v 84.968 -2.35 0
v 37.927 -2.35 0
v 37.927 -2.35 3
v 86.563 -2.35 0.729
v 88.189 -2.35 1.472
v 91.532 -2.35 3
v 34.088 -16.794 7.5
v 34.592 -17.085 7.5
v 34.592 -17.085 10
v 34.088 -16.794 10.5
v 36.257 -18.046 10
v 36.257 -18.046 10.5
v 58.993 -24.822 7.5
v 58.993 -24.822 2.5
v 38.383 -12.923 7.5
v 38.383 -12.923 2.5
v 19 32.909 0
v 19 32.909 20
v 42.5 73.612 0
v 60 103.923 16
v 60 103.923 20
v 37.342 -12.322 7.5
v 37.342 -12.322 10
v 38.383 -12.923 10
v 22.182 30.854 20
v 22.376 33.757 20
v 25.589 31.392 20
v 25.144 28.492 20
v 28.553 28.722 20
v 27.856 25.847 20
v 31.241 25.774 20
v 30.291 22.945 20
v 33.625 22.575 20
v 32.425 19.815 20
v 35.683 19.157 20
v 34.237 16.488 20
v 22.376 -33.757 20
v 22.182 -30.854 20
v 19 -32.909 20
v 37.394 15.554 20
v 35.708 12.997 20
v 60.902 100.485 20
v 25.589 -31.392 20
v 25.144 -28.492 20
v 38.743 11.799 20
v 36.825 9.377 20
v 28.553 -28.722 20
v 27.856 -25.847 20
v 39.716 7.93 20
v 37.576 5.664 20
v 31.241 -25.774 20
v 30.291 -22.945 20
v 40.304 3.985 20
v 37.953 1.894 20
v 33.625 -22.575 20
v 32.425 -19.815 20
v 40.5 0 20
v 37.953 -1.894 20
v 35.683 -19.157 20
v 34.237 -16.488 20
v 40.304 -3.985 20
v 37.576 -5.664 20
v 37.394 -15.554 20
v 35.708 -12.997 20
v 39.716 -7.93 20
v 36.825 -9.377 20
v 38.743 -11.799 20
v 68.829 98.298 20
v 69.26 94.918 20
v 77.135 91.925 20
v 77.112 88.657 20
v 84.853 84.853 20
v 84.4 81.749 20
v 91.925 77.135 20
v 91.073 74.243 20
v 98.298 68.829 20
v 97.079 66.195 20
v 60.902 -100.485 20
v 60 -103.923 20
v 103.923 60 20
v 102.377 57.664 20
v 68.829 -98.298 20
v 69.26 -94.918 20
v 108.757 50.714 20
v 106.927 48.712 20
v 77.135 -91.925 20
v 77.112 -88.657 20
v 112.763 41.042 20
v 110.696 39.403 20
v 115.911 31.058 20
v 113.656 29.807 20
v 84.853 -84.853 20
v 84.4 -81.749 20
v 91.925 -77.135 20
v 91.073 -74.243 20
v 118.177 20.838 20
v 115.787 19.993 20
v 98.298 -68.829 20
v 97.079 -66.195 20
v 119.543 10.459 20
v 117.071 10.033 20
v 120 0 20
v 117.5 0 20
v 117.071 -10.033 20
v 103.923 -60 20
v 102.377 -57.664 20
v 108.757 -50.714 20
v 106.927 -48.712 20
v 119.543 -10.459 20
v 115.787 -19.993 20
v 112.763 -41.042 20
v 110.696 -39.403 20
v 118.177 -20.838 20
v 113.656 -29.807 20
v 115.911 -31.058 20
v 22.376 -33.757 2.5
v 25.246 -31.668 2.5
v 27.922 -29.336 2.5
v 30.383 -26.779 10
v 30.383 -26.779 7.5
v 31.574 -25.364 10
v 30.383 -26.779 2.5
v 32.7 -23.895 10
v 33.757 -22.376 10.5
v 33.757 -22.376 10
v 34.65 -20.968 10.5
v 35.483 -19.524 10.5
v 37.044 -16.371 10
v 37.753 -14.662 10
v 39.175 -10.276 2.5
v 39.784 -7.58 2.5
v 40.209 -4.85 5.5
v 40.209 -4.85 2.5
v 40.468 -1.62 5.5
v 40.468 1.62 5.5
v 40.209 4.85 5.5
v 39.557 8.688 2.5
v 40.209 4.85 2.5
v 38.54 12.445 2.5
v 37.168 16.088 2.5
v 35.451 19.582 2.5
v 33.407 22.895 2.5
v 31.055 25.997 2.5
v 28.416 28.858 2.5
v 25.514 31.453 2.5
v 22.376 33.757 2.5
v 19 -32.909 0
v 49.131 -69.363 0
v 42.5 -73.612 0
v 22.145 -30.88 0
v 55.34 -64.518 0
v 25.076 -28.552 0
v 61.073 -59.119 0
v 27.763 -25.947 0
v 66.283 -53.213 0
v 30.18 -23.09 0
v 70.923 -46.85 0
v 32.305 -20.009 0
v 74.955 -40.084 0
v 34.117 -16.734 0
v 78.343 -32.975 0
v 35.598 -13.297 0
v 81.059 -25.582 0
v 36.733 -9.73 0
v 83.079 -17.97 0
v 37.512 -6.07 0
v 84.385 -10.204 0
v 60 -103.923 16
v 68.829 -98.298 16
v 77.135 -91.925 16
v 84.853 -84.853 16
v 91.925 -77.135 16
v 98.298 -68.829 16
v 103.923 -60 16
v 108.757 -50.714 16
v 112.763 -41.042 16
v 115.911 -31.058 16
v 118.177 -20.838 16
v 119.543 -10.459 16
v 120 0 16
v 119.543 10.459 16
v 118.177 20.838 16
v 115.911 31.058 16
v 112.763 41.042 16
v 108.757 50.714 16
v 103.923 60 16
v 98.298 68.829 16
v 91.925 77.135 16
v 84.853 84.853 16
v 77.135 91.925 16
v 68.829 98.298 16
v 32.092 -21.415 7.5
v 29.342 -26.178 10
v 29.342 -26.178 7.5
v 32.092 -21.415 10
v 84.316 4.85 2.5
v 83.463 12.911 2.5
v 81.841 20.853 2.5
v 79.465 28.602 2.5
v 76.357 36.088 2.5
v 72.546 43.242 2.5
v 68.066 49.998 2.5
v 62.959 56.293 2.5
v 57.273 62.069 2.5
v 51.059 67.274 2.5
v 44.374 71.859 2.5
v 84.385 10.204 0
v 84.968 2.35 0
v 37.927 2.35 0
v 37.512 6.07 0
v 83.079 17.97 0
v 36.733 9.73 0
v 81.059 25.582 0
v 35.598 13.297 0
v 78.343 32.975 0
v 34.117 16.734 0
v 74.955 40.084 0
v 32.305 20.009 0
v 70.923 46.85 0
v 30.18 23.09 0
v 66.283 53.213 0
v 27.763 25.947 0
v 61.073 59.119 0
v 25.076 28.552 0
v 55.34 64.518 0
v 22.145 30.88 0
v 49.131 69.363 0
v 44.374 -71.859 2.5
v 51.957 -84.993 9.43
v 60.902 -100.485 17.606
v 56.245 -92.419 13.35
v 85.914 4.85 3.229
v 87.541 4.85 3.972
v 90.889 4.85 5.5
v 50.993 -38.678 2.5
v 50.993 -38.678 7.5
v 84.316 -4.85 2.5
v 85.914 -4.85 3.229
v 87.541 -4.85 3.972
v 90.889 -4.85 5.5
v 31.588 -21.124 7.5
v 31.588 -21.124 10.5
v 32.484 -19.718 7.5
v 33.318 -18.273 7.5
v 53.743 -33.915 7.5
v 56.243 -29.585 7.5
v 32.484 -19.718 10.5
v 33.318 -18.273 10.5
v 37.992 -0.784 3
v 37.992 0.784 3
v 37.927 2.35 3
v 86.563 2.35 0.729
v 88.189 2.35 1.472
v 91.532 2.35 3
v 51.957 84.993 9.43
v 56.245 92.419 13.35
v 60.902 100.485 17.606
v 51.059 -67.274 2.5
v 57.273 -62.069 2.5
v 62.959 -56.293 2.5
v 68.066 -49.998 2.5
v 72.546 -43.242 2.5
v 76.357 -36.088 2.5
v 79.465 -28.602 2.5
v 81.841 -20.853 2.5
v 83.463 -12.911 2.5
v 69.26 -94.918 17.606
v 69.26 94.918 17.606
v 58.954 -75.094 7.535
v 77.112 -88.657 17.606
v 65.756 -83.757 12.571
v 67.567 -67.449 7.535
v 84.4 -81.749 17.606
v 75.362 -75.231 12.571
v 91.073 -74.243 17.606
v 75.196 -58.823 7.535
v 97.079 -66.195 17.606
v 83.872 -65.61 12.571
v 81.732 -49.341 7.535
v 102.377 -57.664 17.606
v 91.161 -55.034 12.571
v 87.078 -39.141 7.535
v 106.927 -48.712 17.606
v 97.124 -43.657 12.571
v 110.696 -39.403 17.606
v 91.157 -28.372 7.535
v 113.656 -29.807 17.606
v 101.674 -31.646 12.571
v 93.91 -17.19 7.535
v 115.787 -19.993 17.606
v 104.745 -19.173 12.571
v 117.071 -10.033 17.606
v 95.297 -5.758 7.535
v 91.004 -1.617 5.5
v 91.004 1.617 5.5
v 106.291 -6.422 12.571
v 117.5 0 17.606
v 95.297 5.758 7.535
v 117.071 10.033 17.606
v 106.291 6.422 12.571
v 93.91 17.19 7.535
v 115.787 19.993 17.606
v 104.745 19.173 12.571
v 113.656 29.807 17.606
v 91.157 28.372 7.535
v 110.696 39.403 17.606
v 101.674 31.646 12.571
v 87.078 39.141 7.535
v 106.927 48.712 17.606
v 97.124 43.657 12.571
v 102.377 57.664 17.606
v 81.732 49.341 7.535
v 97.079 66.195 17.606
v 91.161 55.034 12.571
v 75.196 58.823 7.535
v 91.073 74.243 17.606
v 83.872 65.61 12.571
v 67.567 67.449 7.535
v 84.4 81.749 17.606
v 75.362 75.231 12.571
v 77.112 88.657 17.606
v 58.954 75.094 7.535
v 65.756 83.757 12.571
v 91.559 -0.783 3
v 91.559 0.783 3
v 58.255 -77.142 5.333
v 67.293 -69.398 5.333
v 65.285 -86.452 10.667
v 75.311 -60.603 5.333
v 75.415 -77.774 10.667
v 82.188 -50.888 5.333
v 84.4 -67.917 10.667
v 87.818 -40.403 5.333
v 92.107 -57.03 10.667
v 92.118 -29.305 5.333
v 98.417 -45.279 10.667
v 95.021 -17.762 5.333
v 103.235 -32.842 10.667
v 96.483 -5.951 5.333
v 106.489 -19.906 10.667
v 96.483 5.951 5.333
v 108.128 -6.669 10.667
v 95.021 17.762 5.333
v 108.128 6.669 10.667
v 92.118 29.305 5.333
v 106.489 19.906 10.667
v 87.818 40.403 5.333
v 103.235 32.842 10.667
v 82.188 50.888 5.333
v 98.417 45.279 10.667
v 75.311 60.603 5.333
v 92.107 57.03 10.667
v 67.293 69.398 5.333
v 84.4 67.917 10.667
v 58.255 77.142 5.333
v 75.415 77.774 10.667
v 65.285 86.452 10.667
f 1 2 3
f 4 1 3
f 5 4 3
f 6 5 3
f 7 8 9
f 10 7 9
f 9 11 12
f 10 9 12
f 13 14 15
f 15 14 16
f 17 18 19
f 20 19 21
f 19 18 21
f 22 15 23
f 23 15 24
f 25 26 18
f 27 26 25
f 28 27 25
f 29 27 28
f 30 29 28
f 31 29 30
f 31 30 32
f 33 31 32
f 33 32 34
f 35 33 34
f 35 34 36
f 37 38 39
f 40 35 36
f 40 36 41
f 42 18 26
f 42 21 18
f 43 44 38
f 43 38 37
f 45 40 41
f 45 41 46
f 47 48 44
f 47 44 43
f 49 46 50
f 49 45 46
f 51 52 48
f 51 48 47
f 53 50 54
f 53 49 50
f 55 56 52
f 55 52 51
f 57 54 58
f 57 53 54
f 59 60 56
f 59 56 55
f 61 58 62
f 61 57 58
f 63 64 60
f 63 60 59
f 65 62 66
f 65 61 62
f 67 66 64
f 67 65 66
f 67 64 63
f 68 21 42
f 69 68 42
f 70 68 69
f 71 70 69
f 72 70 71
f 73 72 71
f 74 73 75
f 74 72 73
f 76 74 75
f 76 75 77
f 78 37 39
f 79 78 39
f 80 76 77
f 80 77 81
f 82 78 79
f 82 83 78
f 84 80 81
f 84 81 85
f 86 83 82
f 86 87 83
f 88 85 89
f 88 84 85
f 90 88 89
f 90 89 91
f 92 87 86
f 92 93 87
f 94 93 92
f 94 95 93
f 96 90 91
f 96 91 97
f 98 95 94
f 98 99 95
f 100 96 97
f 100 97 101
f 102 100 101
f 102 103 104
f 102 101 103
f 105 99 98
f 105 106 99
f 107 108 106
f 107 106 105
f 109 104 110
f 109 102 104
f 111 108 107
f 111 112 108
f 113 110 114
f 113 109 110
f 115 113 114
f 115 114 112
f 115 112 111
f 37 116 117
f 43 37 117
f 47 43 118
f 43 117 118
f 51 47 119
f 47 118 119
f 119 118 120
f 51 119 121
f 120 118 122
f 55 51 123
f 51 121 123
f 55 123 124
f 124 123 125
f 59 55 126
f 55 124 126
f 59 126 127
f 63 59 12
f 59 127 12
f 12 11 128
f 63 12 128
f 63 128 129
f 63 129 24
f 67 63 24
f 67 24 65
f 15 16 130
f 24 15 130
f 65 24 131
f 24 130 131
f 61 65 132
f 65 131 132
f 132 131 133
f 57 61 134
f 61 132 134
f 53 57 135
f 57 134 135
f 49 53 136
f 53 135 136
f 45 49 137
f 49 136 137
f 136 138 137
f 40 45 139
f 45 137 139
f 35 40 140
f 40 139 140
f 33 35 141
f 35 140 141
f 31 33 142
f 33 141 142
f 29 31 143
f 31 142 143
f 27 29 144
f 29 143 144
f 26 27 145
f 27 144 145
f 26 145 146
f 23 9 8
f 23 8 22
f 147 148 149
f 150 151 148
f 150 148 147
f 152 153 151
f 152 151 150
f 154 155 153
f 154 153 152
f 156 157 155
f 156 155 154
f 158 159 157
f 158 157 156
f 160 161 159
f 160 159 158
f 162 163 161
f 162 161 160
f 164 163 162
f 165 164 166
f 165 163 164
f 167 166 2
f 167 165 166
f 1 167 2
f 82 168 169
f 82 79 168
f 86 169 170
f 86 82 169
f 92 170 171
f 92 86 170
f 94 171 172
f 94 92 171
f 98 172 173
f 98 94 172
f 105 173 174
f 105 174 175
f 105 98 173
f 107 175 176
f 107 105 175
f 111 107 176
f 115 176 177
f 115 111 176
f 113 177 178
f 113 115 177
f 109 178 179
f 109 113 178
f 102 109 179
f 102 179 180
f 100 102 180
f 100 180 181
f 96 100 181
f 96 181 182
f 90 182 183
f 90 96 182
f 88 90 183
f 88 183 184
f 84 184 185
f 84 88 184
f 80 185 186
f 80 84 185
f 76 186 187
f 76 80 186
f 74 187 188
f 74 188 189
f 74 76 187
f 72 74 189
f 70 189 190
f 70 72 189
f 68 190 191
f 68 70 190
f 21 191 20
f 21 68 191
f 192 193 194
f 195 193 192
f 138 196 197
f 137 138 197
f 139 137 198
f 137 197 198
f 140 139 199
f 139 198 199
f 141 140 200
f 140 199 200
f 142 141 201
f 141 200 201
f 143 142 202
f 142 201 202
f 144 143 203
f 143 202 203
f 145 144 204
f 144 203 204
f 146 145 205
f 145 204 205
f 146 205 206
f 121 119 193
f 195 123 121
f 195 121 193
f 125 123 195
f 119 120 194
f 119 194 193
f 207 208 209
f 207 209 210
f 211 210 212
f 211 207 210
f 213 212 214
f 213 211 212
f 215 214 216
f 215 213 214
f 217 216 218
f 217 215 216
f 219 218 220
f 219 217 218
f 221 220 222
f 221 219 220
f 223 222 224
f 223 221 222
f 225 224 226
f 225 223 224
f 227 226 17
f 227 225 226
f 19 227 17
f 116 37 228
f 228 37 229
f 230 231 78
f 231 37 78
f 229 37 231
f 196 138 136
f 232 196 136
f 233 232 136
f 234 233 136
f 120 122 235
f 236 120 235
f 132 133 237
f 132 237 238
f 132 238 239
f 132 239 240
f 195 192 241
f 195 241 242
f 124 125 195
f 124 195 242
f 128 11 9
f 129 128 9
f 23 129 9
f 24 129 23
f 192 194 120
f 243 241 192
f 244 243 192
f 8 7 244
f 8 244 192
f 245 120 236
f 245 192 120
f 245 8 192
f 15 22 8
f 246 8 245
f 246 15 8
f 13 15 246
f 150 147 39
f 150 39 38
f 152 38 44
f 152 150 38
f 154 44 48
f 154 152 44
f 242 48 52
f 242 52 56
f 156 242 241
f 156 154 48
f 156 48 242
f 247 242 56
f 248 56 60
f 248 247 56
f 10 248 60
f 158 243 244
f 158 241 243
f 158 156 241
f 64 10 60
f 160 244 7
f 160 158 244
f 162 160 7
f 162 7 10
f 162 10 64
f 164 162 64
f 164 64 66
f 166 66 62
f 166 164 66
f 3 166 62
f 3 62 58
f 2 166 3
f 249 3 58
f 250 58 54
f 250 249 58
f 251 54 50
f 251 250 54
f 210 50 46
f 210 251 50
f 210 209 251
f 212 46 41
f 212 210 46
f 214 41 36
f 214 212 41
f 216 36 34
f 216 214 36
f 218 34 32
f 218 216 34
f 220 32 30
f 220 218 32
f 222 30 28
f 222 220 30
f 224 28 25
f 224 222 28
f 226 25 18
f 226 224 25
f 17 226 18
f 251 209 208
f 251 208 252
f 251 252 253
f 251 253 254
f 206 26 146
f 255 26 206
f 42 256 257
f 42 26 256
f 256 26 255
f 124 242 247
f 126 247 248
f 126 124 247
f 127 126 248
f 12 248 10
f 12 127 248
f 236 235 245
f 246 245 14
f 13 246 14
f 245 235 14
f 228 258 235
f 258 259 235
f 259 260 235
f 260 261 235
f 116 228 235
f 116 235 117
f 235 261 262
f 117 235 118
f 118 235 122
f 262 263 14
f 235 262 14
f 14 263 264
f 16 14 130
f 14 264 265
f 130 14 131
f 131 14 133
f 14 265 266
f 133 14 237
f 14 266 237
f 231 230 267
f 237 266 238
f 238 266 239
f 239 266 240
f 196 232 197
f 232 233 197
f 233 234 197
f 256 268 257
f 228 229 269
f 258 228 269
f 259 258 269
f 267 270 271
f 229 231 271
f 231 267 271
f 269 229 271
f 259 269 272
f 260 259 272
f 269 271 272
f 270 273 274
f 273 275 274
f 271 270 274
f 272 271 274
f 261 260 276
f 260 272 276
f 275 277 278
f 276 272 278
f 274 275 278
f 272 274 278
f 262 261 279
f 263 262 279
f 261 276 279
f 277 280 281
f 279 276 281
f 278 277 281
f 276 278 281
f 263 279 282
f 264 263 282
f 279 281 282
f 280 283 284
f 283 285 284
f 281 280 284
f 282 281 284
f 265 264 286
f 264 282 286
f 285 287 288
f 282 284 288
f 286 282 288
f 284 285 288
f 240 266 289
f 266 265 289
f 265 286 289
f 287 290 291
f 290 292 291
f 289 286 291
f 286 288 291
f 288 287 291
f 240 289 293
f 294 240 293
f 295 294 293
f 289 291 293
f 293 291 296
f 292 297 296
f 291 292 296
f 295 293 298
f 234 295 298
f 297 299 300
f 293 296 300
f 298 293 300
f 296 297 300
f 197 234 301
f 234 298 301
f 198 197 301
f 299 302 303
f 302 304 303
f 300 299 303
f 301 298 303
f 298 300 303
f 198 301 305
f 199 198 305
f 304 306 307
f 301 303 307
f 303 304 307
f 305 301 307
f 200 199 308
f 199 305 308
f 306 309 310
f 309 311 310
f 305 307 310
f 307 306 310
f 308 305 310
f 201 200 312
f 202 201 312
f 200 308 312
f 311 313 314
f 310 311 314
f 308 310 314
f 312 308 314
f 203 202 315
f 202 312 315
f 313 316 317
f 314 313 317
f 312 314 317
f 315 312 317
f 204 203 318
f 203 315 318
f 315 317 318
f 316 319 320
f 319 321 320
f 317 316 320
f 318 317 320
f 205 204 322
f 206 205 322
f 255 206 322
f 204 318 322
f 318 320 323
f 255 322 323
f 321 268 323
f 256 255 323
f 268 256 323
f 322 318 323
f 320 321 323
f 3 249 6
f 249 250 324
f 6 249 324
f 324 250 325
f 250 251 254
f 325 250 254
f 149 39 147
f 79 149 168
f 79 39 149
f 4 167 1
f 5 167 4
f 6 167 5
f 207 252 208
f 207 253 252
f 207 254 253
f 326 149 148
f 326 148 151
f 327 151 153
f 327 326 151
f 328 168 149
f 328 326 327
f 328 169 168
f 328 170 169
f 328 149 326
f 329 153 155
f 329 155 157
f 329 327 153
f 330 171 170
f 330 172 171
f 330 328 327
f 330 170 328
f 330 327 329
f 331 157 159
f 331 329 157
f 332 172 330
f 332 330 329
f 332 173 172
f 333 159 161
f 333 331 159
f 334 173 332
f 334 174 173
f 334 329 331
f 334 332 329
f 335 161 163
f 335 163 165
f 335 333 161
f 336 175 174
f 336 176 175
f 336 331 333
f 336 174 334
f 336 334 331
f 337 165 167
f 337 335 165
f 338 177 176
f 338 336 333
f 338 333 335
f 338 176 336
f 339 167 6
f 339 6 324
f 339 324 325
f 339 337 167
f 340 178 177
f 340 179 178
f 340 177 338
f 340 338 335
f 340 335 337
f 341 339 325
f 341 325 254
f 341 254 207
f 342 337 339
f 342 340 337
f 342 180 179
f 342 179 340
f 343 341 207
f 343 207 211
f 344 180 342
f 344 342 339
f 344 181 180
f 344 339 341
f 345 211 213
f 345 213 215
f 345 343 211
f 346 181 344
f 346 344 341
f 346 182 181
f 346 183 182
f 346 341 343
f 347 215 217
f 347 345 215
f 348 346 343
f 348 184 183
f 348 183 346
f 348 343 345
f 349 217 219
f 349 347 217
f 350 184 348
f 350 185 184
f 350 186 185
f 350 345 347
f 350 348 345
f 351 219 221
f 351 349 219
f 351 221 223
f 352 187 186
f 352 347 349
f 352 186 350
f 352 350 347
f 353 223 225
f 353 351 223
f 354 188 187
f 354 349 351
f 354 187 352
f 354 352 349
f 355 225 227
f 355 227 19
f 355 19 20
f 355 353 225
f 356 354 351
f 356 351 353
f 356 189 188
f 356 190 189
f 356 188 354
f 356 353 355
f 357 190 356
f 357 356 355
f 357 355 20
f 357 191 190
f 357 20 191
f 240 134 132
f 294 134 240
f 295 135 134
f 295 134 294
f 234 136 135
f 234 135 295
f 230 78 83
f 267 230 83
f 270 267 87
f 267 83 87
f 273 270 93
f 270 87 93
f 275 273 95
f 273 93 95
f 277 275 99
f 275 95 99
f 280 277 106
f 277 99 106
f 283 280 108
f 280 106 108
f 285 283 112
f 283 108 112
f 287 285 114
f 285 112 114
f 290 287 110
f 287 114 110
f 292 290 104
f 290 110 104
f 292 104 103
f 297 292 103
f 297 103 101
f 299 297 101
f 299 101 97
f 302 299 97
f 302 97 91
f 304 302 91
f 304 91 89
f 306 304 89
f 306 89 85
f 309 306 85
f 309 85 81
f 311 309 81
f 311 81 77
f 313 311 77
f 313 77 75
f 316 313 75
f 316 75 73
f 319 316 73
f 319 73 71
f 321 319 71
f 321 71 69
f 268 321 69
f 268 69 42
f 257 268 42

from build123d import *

# Parameters (mm, degrees)
F2_ANGLE_BACK = 60
F2_ANGLE      = 120
F3_W          = 160
F3_H          = 4.7
F4_DEPTH      = 3
F5_T          = -2.5
F7_DEPTH      = 5
F8_W          = 5
F8_H          = 3
F9_DEPTH      = 99.0080415552
F10_W         = 16
F10_H         = 2.5
F11_DEPTH     = 25


with BuildPart() as f2:
    # F0 (on Front) → F2 (revolve)
    with BuildSketch(Plane.XZ, mode=Mode.PRIVATE) as f2_sk:
        Polygon((38, 20), (38, 0), (85, 0), (120, 16), (120, 20), align=None)
    revolve(f2_sk.sketch.rotate(Axis((0, 0, 35.0643768907), (0, 0, 1)), -F2_ANGLE_BACK), axis=Axis((0, 0, 35.0643768907), (0, 0, 1)), revolution_arc=F2_ANGLE)

    # F3 (on Top) → F4 (cut)
    with BuildSketch(Plane.XY):
        with Locations((80, 0)):
            Rectangle(F3_W, F3_H)
    extrude(amount=F4_DEPTH, mode=Mode.SUBTRACT)

    # F5
    f5_openings = [f2.faces().sort_by_distance(p)[0] for p in [
        (71.198195, 0, 20),
    ]]
    offset(amount=F5_T, openings=f5_openings, kind=Kind.INTERSECTION)

    # F6 (on face) → F7 (join)
    with BuildSketch(Plane.XY.offset(2.5)):
        with BuildLine():
            ThreePointArc((30.3829536253, -26.7792107614), (35.0740288533, -20.25), (38.3829536253, -12.9228043008))
            Line((38.3829536253, -12.9228043008), (37.3419780457, -12.3217967697))
            Line((37.3419780457, -12.3217967697), (29.3419780457, -26.1782032303))
            Line((29.3419780457, -26.1782032303), (30.3829536253, -26.7792107614))
        make_face()
        with BuildLine():
            Line((58.9926131403, -24.8217967697), (38.3829536253, -12.9228043008))
            ThreePointArc((38.3829536253, -12.9228043008), (35.0740288533, -20.25), (30.3829536253, -26.7792107614))
            Line((30.3829536253, -26.7792107614), (50.9926131403, -38.6782032303))
            Line((50.9926131403, -38.6782032303), (58.9926131403, -24.8217967697))
        make_face()
    extrude(amount=F7_DEPTH)

    # F8 (on face) → F9 (cut, through all)
    with BuildSketch(Plane(origin=(54.9926131403, -31.75, 0), x_dir=(0.5, 0.8660254038, 0), z_dir=(0.8660254038, -0.5, 0))):
        with Locations((0, 9)):
            Rectangle(F8_W, F8_H)
    extrude(amount=-F9_DEPTH, mode=Mode.SUBTRACT)

    # F10 (on face) → F11 (cut)
    with BuildSketch(Plane(origin=(54.9926131403, -31.75, 0), x_dir=(0.5, 0.8660254038, 0), z_dir=(0.8660254038, -0.5, 0))):
        with Locations((0, 8.75)):
            Rectangle(F10_W, F10_H)
    extrude(amount=-F11_DEPTH, mode=Mode.SUBTRACT)


solid = f2.part
